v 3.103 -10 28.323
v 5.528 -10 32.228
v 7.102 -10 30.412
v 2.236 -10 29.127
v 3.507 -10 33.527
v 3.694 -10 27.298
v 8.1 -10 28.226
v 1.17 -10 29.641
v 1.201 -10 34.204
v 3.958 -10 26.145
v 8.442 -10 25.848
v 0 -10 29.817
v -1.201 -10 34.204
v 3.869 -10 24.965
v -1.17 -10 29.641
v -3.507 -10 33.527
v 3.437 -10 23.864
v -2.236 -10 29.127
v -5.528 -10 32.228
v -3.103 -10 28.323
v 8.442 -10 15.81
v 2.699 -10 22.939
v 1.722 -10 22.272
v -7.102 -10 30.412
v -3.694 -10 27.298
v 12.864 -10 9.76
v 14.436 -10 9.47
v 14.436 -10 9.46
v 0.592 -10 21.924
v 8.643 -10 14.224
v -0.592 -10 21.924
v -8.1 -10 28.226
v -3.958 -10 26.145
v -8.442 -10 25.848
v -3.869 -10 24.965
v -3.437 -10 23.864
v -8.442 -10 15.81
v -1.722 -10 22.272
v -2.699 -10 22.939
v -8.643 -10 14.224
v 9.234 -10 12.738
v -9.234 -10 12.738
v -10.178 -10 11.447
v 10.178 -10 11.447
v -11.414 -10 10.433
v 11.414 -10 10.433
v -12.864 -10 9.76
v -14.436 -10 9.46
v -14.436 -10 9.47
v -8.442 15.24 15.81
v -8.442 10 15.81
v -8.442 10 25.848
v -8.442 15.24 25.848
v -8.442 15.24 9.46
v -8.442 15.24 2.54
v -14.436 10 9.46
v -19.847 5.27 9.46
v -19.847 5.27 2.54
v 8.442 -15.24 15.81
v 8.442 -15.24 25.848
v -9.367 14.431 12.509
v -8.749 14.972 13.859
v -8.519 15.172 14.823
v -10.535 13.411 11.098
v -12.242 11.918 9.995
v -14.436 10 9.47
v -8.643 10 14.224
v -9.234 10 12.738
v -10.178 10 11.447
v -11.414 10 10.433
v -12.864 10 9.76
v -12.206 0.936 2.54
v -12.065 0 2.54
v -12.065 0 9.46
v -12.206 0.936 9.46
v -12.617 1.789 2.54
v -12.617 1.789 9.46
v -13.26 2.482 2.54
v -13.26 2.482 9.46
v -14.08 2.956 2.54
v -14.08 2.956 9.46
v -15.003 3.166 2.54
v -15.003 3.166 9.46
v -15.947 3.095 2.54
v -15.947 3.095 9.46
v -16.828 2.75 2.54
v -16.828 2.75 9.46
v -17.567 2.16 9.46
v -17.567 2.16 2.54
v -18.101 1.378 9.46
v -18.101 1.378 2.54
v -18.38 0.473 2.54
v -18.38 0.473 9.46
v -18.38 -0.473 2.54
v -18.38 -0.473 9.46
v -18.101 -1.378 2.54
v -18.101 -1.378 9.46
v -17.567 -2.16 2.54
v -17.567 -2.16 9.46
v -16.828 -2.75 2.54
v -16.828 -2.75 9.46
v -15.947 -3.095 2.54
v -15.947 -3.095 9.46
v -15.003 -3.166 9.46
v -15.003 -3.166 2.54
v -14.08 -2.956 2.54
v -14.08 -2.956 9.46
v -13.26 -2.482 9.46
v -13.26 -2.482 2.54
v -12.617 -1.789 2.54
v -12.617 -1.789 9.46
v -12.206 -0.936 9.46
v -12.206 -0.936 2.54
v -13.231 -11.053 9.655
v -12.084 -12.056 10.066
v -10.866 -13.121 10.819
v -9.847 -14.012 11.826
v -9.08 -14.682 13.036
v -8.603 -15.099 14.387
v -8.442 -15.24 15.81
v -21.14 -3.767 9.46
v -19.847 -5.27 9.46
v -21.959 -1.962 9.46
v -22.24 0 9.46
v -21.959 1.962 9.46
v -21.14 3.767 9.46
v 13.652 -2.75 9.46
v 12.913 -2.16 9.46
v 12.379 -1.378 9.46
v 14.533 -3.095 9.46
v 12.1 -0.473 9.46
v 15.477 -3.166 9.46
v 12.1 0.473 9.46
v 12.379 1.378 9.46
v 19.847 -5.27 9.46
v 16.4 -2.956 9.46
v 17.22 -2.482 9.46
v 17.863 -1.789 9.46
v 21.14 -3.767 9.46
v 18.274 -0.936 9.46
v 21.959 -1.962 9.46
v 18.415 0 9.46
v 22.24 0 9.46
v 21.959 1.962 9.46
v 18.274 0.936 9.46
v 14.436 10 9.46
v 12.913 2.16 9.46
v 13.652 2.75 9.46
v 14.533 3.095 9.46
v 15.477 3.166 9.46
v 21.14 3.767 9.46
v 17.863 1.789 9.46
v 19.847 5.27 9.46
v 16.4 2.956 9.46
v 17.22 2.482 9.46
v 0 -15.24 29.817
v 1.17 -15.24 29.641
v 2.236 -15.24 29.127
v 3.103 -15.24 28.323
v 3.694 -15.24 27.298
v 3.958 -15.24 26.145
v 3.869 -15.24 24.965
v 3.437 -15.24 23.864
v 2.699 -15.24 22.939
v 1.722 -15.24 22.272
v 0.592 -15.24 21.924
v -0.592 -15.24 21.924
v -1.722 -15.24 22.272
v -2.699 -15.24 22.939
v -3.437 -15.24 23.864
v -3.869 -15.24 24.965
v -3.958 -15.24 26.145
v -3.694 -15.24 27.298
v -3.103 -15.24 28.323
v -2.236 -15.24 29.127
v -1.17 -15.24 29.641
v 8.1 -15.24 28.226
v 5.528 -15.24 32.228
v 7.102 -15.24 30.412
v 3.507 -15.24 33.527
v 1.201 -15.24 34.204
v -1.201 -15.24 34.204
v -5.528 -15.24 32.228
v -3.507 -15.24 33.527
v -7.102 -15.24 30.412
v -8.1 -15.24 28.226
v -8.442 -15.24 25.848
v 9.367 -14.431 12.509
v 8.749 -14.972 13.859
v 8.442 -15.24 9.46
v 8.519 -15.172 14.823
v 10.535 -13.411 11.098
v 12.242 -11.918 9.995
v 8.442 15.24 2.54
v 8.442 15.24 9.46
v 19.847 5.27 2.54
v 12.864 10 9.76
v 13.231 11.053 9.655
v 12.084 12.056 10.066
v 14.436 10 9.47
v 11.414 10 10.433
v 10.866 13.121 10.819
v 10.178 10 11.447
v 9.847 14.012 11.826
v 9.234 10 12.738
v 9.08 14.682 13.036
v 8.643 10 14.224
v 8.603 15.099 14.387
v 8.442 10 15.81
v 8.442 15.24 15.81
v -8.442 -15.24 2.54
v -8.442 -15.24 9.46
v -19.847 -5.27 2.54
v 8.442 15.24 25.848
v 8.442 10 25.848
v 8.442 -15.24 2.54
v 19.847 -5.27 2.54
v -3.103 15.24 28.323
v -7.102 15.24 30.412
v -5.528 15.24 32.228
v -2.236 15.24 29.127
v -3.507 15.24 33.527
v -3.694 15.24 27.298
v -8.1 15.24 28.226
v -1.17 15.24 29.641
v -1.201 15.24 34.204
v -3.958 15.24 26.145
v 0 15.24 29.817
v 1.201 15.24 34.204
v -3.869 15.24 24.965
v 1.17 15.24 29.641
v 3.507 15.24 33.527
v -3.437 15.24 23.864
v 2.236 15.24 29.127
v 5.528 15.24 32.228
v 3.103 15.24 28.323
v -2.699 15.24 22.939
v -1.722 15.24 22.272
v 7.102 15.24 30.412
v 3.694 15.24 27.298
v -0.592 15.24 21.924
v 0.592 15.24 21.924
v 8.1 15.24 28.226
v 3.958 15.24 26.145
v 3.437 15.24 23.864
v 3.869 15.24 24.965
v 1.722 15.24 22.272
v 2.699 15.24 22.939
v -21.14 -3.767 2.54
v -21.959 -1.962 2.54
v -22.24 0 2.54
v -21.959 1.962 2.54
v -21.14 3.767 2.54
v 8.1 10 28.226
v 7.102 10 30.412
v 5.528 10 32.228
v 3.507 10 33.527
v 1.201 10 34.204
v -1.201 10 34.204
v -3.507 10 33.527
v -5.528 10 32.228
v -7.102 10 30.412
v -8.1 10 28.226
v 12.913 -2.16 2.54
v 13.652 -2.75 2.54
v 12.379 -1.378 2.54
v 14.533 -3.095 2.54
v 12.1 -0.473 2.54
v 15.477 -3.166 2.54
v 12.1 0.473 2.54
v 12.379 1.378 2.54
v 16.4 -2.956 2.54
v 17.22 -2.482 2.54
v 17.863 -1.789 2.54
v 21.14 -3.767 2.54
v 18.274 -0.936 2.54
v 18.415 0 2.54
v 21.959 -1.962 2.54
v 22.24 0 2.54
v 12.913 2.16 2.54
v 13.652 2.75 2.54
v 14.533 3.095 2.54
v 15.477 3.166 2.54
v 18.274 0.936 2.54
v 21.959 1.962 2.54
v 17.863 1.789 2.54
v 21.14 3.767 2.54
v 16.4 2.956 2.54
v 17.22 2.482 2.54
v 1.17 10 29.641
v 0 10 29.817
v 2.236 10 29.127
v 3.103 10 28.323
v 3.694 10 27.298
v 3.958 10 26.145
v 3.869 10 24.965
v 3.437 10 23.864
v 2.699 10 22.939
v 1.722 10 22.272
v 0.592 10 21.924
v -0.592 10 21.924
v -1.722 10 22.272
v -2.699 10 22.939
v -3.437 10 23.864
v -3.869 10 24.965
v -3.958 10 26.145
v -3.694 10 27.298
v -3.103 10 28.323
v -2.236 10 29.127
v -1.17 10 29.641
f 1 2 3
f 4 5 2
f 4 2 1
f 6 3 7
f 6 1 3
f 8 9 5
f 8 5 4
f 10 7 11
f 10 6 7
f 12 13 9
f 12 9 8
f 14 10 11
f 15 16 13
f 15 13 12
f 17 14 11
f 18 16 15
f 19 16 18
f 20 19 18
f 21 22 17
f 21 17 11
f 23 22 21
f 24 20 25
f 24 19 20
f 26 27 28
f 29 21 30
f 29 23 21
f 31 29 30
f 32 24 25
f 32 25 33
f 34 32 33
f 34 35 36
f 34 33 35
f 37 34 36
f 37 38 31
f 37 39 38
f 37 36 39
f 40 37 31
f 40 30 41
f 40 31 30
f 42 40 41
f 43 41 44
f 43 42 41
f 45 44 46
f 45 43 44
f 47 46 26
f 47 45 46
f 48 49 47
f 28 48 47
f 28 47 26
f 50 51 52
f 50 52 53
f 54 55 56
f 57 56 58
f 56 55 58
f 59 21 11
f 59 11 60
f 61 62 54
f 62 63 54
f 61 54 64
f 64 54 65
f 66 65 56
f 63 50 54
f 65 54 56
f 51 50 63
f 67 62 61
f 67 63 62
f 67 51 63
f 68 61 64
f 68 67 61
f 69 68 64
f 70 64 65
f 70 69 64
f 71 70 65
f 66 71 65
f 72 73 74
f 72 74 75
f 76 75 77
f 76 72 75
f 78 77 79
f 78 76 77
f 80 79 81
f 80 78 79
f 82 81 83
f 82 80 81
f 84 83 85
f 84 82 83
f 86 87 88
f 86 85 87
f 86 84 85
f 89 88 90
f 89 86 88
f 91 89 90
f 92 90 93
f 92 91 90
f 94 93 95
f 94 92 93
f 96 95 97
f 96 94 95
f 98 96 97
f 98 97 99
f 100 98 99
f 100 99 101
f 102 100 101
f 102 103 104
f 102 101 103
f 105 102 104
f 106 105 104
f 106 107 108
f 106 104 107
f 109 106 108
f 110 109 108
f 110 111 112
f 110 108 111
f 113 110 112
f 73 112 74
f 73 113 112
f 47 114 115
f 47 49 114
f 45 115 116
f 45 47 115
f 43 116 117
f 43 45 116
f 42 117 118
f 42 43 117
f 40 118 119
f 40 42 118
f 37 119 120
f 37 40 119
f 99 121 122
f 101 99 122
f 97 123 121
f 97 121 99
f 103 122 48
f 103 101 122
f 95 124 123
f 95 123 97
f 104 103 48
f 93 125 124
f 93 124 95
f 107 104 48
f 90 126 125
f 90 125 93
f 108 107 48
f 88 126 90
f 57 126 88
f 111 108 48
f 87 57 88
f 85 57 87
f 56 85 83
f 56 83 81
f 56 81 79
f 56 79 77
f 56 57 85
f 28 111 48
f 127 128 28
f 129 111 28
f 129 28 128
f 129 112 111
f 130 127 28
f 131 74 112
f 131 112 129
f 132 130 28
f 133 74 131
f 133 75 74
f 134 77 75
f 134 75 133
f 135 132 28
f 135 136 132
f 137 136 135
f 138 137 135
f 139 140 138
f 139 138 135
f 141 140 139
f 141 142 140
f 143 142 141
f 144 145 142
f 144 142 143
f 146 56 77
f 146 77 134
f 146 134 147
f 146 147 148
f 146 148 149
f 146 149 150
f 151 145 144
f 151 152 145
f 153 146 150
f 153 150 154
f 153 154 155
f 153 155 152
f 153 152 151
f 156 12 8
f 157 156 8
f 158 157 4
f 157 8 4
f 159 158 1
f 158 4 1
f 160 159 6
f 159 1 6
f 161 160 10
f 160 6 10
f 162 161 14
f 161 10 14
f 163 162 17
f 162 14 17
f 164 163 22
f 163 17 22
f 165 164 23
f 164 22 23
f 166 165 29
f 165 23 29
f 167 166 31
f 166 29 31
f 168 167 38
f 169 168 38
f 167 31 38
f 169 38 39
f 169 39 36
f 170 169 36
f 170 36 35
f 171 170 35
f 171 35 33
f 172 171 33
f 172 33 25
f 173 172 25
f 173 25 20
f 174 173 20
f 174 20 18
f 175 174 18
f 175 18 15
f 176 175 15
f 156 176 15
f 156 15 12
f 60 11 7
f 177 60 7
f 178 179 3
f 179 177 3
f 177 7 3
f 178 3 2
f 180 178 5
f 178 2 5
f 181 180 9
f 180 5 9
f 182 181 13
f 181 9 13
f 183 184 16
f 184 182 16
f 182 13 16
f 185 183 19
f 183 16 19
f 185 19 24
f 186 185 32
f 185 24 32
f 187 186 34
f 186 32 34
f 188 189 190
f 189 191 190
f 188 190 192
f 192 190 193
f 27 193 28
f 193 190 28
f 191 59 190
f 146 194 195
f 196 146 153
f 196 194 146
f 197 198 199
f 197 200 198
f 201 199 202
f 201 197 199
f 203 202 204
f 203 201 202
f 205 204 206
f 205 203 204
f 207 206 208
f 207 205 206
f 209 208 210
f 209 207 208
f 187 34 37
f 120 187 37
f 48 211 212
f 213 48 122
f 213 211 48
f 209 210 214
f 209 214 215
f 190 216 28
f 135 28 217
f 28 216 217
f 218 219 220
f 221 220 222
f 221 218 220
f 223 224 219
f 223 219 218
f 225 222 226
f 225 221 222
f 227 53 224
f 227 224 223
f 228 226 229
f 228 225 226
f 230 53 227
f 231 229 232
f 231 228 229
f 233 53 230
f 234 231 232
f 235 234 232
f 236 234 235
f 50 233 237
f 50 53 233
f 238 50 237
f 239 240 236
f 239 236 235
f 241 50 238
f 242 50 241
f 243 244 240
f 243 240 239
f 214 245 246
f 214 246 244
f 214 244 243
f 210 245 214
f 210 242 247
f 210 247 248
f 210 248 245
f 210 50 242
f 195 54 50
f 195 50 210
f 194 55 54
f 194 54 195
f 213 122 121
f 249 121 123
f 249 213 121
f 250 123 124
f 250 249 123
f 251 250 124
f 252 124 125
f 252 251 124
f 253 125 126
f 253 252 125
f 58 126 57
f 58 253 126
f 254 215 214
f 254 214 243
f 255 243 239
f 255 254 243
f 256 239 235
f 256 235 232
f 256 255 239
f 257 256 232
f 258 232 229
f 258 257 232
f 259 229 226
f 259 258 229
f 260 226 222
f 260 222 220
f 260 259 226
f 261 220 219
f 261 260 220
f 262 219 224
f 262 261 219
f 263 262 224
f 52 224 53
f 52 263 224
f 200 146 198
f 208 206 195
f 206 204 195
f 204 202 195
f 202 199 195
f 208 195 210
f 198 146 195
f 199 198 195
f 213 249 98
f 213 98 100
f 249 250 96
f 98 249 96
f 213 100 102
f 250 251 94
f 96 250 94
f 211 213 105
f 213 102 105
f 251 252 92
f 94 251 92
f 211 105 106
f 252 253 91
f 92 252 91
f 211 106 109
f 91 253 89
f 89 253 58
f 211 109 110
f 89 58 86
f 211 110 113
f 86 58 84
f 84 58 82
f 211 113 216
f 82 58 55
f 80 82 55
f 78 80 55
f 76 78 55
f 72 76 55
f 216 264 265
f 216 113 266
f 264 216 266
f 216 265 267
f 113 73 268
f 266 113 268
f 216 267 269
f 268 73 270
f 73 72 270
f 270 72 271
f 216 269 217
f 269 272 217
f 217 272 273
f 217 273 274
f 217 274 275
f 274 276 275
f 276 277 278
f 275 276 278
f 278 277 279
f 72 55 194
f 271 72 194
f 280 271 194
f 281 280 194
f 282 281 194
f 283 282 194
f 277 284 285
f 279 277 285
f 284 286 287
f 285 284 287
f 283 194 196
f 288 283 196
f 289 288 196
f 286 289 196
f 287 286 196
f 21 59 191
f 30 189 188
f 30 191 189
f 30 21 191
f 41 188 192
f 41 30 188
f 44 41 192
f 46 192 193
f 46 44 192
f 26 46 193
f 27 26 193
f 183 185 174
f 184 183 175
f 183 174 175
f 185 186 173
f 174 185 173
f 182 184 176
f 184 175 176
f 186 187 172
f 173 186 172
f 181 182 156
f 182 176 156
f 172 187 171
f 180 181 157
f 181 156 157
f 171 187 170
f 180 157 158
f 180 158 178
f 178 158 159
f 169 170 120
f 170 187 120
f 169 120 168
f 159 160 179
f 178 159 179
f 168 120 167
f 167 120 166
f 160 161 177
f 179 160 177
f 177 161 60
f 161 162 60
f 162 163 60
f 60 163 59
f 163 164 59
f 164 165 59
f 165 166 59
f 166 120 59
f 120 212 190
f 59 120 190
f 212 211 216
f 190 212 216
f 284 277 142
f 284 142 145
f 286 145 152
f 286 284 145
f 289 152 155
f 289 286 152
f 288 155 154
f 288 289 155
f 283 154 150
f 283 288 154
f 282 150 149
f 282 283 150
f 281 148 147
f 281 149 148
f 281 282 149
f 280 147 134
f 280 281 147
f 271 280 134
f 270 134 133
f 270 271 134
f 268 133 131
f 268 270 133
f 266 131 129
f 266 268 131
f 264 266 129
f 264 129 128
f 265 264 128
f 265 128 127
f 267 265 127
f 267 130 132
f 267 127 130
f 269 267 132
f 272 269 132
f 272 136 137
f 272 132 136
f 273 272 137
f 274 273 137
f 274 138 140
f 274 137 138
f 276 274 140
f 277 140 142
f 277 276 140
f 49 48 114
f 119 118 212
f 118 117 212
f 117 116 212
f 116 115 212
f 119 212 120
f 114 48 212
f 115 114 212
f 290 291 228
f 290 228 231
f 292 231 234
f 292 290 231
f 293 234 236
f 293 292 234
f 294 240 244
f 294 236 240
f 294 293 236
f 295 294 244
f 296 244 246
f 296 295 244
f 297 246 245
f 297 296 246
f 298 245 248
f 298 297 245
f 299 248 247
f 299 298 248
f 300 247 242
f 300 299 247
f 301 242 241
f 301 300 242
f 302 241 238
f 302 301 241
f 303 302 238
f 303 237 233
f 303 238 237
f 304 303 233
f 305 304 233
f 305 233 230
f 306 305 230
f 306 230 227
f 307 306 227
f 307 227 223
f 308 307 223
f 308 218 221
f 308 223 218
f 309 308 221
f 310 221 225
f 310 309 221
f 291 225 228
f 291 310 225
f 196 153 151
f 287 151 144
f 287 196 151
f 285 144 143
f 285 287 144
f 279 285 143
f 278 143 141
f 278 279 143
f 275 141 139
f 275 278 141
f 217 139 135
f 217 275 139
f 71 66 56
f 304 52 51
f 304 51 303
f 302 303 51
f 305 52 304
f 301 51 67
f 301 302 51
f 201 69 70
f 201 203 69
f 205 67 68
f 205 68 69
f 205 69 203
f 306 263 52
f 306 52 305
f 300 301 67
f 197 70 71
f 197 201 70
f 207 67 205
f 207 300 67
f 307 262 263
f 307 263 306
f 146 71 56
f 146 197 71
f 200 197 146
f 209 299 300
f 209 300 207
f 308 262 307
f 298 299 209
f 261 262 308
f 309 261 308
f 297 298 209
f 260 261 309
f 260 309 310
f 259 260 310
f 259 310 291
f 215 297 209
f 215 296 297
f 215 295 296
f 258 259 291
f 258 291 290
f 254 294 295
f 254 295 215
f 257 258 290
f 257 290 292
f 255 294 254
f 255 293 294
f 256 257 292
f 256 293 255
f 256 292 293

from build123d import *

# Parameters (mm, degrees)
SKETCH1_W                      = 46.48
SKETCH1_H                      = 30.48
SKETCH1_R                      = 3.175
BOSS_EXTRUDE1_DEPTH            = 9.46
SKETCH2_W                      = 46.48
SKETCH2_H                      = 5.24
BOSS_EXTRUDE2_DEPTH            = 53
CUT_EXTRUDE1_REACH             = 70.364
SKETCH4_R                      = 3.96875
CUT_EXTRUDE1_DIRECTION_2_REACH = 70.364
CUT_EXTRUDE3_REACH             = 70.364
CUT_EXTRUDE3_DIRECTION_2_REACH = 70.364
CUT_EXTRUDE4_DEPTH             = 9.46
BOSS_EXTRUDE3_DEPTH            = 9.46
FILLET3_R                      = 6.35
CUT_EXTRUDE5_DEPTH             = 2.54


with BuildPart() as part:
    # Sketch1 → Boss-Extrude1 (new body)
    with BuildSketch(Plane.XY):
        Rectangle(SKETCH1_W, SKETCH1_H)
        with Locations((15.24, 0)):
            Circle(SKETCH1_R, mode=Mode.SUBTRACT)
        with Locations((-15.24, 0)):
            Circle(SKETCH1_R, mode=Mode.SUBTRACT)
    extrude(amount=BOSS_EXTRUDE1_DEPTH)

    # Sketch2 → Boss-Extrude2 (add)
    with BuildSketch(Plane.XY.offset(9.46)):
        with Locations((0, 12.62)):
            Rectangle(SKETCH2_W, SKETCH2_H)
        with Locations((0, -12.62)):
            Rectangle(SKETCH2_W, SKETCH2_H)
    extrude(amount=BOSS_EXTRUDE2_DEPTH)

    # Cut-Extrude1: up to this face of the body (flat: up to its plane)
    cut_extrude1_end = Plane(part.part.faces().sort_by_distance((0, -15.24, 31.23))[0])
    # Sketch4 → Cut-Extrude1 (cut, up to the picked face)
    with BuildSketch(Plane(origin=(0, 0, 0), x_dir=(1, 0, 0), z_dir=(0, 1, 0)), mode=Mode.PRIVATE) as cut_extrude1_sk1:
        with Locations(Location((0, -25.8481308, 0), (0, 0, 270))):
            Circle(SKETCH4_R)
    cut_extrude1_tool1 = split(extrude(cut_extrude1_sk1.sketch, amount=-CUT_EXTRUDE1_REACH, mode=Mode.PRIVATE), bisect_by=cut_extrude1_end, keep=Keep.BOTH, mode=Mode.PRIVATE)
    add(cut_extrude1_tool1.solids().sort_by(Axis((0, 0, 25.848131), (0, -1, 0)))[0], mode=Mode.SUBTRACT)

    # Cut-Extrude1 direction 2: up to this face of the body (flat: up to its plane)
    cut_extrude1_direction_2_end = Plane(part.part.faces().sort_by_distance((0, 15.24, 31.23))[0])
    # Sketch4 → Cut-Extrude1 direction 2 (cut, up to the picked face)
    with BuildSketch(Plane(origin=(0, 0, 0), x_dir=(1, 0, 0), z_dir=(0, 1, 0)), mode=Mode.PRIVATE) as cut_extrude1_direction_2_sk1:
        with Locations(Location((0, -25.8481308, 0), (0, 0, 270))):
            Circle(SKETCH4_R)
    cut_extrude1_direction_2_tool1 = split(extrude(cut_extrude1_direction_2_sk1.sketch, amount=CUT_EXTRUDE1_DIRECTION_2_REACH, mode=Mode.PRIVATE), bisect_by=cut_extrude1_direction_2_end, keep=Keep.BOTH, mode=Mode.PRIVATE)
    add(cut_extrude1_direction_2_tool1.solids().sort_by(Axis((0, 0, 25.848131), (0, 1, 0)))[0], mode=Mode.SUBTRACT)

    # Cut-Extrude3: up to this face of the body (flat: up to its plane)
    cut_extrude3_end = Plane(part.part.faces().sort_by_distance((0, -15.24, 31.323322986))[0])
    # Sketch6 → Cut-Extrude3 (cut, up to the picked face)
    with BuildSketch(Plane(origin=(0, 0, 0), x_dir=(1, 0, 0), z_dir=(0, 1, 0)), mode=Mode.PRIVATE) as cut_extrude3_sk1:
        with BuildLine():
            Line((-8.4418692, -25.8481308), (-8.4418692, -17.46))
            Line((-8.4418692, -17.46), (-8.4418692, -9.46))
            Line((-8.4418692, -9.46), (-16.4418692, -9.46))
            Line((-16.4418692, -9.46), (-23.24, -9.46))
            Line((-23.24, -9.46), (-23.24, -62.46))
            Line((-23.24, -62.46), (23.24, -62.46))
            Line((23.24, -62.46), (23.24, -9.46))
            Line((23.24, -9.46), (16.4418692, -9.46))
            Line((16.4418692, -9.46), (8.4418692, -9.46))
            Line((8.4418692, -9.46), (8.4418692, -17.46))
            Line((8.4418692, -17.46), (8.4418692, -25.8481308))
            ThreePointArc((8.4418692, -25.8481308), (0, -34.29), (-8.4418692, -25.8481308))
        make_face()
    cut_extrude3_tool1 = split(extrude(cut_extrude3_sk1.sketch, amount=-CUT_EXTRUDE3_REACH, mode=Mode.PRIVATE), bisect_by=cut_extrude3_end, keep=Keep.BOTH, mode=Mode.PRIVATE)
    add(cut_extrude3_tool1.solids().sort_by(Axis((0, 0, 38.753518), (0, -1, 0)))[0], mode=Mode.SUBTRACT)

    # Cut-Extrude3 direction 2: up to this face of the body (flat: up to its plane)
    cut_extrude3_direction_2_end = Plane(part.part.faces().sort_by_distance((0, 15.24, 31.323322986))[0])
    # Sketch6 → Cut-Extrude3 direction 2 (cut, up to the picked face)
    with BuildSketch(Plane(origin=(0, 0, 0), x_dir=(1, 0, 0), z_dir=(0, 1, 0)), mode=Mode.PRIVATE) as cut_extrude3_direction_2_sk1:
        with BuildLine():
            Line((-8.4418692, -25.8481308), (-8.4418692, -17.46))
            Line((-8.4418692, -17.46), (-8.4418692, -9.46))
            Line((-8.4418692, -9.46), (-16.4418692, -9.46))
            Line((-16.4418692, -9.46), (-23.24, -9.46))
            Line((-23.24, -9.46), (-23.24, -62.46))
            Line((-23.24, -62.46), (23.24, -62.46))
            Line((23.24, -62.46), (23.24, -9.46))
            Line((23.24, -9.46), (16.4418692, -9.46))
            Line((16.4418692, -9.46), (8.4418692, -9.46))
            Line((8.4418692, -9.46), (8.4418692, -17.46))
            Line((8.4418692, -17.46), (8.4418692, -25.8481308))
            ThreePointArc((8.4418692, -25.8481308), (0, -34.29), (-8.4418692, -25.8481308))
        make_face()
    cut_extrude3_direction_2_tool1 = split(extrude(cut_extrude3_direction_2_sk1.sketch, amount=CUT_EXTRUDE3_DIRECTION_2_REACH, mode=Mode.PRIVATE), bisect_by=cut_extrude3_direction_2_end, keep=Keep.BOTH, mode=Mode.PRIVATE)
    add(cut_extrude3_direction_2_tool1.solids().sort_by(Axis((0, 0, 38.753518), (0, 1, 0)))[0], mode=Mode.SUBTRACT)

    # Sketch7 → Cut-Extrude4 (cut)
    with BuildSketch(Plane.XY):
        with BuildLine():
            ThreePointArc((-15.24, -7), (-22.24, 0), (-15.24, 7))
            Line((-15.24, 7), (-8.4418692, 7))
            Line((-8.4418692, 7), (-8.4418692, 15.24))
            Line((-8.4418692, 15.24), (-23.24, 15.24))
            Line((-23.24, 15.24), (-23.24, -15.24))
            Line((-23.24, -15.24), (-8.4418692, -15.24))
            Line((-8.4418692, -15.24), (-8.4418692, -7))
            Line((-8.4418692, -7), (-15.24, -7))
        make_face()
        with BuildLine():
            Line((8.4418692, 15.24), (8.4418692, 7))
            Line((8.4418692, 7), (15.24, 7))
            ThreePointArc((15.24, 7), (22.24, 0), (15.24, -7))
            Line((15.24, -7), (8.4418692, -7))
            Line((8.4418692, -7), (8.4418692, -15.24))
            Line((8.4418692, -15.24), (23.24, -15.24))
            Line((23.24, -15.24), (23.24, 15.24))
            Line((23.24, 15.24), (8.4418692, 15.24))
        make_face()
    extrude(amount=CUT_EXTRUDE4_DEPTH, mode=Mode.SUBTRACT)

    # Sketch8 → Boss-Extrude3 (add)
    with BuildSketch(Plane.XY):
        with BuildLine():
            Line((8.4418692, -15.24), (19.846982329, -5.27026696))
            ThreePointArc((19.846982329, -5.27026696), (17.700501096, -6.553314761), (15.24, -7))
            Line((15.24, -7), (8.4418692, -7))
            Line((8.4418692, -7), (8.4418692, -15.24))
        make_face()
        with BuildLine():
            ThreePointArc((-19.846982329, -5.27026696), (-17.700501096, -6.553314761), (-15.24, -7))
            Line((-15.24, -7), (-8.4418692, -7))
            Line((-8.4418692, -7), (-8.4418692, -15.24))
            Line((-8.4418692, -15.24), (-19.846982329, -5.27026696))
        make_face()
        with BuildLine():
            Line((8.4418692, 15.24), (19.846982329, 5.27026696))
            ThreePointArc((19.846982329, 5.27026696), (17.700501096, 6.553314761), (15.24, 7))
            Line((15.24, 7), (8.4418692, 7))
            Line((8.4418692, 7), (8.4418692, 15.24))
        make_face()
        with BuildLine():
            Line((-8.4418692, 15.24), (-19.846982329, 5.27026696))
            ThreePointArc((-19.846982329, 5.27026696), (-17.700501096, 6.553314761), (-15.24, 7))
            Line((-15.24, 7), (-8.4418692, 7))
            Line((-8.4418692, 7), (-8.4418692, 15.24))
        make_face()
    extrude(amount=BOSS_EXTRUDE3_DEPTH)

    # Fillet3
    # the kernel refuses this fillet: 6.35 mm, written as the material it adds along each edge
    with BuildSketch(Plane(origin=(8.4418692, -10, 9.46), x_dir=(0, 0, 1), z_dir=(0, -1, 0))) as fillet3_piece_1_section:
        with BuildLine():
            CenterArc((FILLET3_R, -FILLET3_R), FILLET3_R, 90, 90)
            Line((0, -FILLET3_R), (0, 0))
            Line((0, 0), (FILLET3_R, 0))
        make_face()
    fillet3_piece_1 = extrude(amount=5.24, mode=Mode.PRIVATE)
    fillet3_piece_1 = split(fillet3_piece_1, bisect_by=Plane(origin=(10.547300474, -13.399545855, 11.138669317), z_dir=(-0.6581403326503757, 0.7528952799286586, 0)), keep=Keep.TOP, mode=Mode.PRIVATE)
    add(fillet3_piece_1)
    with BuildSketch(Plane(origin=(-8.4418692, -10, 9.46), x_dir=(0, 0, 1), z_dir=(0, -1, 0))) as fillet3_piece_2_section:
        with BuildLine():
            CenterArc((FILLET3_R, FILLET3_R), FILLET3_R, 180, 90)
            Line((0, FILLET3_R), (0, 0))
            Line((0, 0), (FILLET3_R, 0))
        make_face()
    fillet3_piece_2 = extrude(amount=5.24, mode=Mode.PRIVATE)
    fillet3_piece_2 = split(fillet3_piece_2, bisect_by=Plane(origin=(-10.547300474, -13.399545855, 11.138669317), z_dir=(0.6581403326503753, 0.7528952799286588, 0)), keep=Keep.TOP, mode=Mode.PRIVATE)
    add(fillet3_piece_2)
    with BuildSketch(Plane(origin=(8.4418692, 10, 9.46), x_dir=(1, 0, 0), z_dir=(0, 1, 0))) as fillet3_piece_3_section:
        with BuildLine():
            CenterArc((FILLET3_R, -FILLET3_R), FILLET3_R, 90, 90)
            Line((0, -FILLET3_R), (0, 0))
            Line((0, 0), (FILLET3_R, 0))
        make_face()
    fillet3_piece_3 = extrude(amount=5.24, mode=Mode.PRIVATE)
    fillet3_piece_3 = split(fillet3_piece_3, bisect_by=Plane(origin=(10.547300473, 13.399545855, 11.138669317), z_dir=(-0.6581403326503754, -0.7528952799286586, 0)), keep=Keep.TOP, mode=Mode.PRIVATE)
    add(fillet3_piece_3)
    with BuildSketch(Plane(origin=(-8.4418692, 10, 9.46), x_dir=(-1, 0, 0), z_dir=(0, 1, 0))) as fillet3_piece_4_section:
        with BuildLine():
            CenterArc((FILLET3_R, FILLET3_R), FILLET3_R, 180, 90)
            Line((0, FILLET3_R), (0, 0))
            Line((0, 0), (FILLET3_R, 0))
        make_face()
    fillet3_piece_4 = extrude(amount=5.24, mode=Mode.PRIVATE)
    fillet3_piece_4 = split(fillet3_piece_4, bisect_by=Plane(origin=(-10.547300473, 13.399545855, 11.138669317), z_dir=(0.6581403326503757, -0.7528952799286586, 0)), keep=Keep.TOP, mode=Mode.PRIVATE)
    add(fillet3_piece_4)

    # Sketch10 → Cut-Extrude5 (cut)
    with BuildSketch(Plane.XY):
        with BuildLine():
            Line((-8.4418692, 15.24), (-19.846982329, 5.27026696))
            ThreePointArc((-19.846982329, 5.27026696), (-22.24, 0), (-19.846982329, -5.27026696))
            Line((-19.846982329, -5.27026696), (-8.4418692, -15.24))
            Line((-8.4418692, -15.24), (8.4418692, -15.24))
            Line((8.4418692, -15.24), (19.846982329, -5.27026696))
            ThreePointArc((19.846982329, -5.27026696), (22.24, 0), (19.846982329, 5.27026696))
            Line((19.846982329, 5.27026696), (8.4418692, 15.24))
            Line((8.4418692, 15.24), (-8.4418692, 15.24))
        make_face()
    extrude(amount=CUT_EXTRUDE5_DEPTH, mode=Mode.SUBTRACT)


solid = part.part
